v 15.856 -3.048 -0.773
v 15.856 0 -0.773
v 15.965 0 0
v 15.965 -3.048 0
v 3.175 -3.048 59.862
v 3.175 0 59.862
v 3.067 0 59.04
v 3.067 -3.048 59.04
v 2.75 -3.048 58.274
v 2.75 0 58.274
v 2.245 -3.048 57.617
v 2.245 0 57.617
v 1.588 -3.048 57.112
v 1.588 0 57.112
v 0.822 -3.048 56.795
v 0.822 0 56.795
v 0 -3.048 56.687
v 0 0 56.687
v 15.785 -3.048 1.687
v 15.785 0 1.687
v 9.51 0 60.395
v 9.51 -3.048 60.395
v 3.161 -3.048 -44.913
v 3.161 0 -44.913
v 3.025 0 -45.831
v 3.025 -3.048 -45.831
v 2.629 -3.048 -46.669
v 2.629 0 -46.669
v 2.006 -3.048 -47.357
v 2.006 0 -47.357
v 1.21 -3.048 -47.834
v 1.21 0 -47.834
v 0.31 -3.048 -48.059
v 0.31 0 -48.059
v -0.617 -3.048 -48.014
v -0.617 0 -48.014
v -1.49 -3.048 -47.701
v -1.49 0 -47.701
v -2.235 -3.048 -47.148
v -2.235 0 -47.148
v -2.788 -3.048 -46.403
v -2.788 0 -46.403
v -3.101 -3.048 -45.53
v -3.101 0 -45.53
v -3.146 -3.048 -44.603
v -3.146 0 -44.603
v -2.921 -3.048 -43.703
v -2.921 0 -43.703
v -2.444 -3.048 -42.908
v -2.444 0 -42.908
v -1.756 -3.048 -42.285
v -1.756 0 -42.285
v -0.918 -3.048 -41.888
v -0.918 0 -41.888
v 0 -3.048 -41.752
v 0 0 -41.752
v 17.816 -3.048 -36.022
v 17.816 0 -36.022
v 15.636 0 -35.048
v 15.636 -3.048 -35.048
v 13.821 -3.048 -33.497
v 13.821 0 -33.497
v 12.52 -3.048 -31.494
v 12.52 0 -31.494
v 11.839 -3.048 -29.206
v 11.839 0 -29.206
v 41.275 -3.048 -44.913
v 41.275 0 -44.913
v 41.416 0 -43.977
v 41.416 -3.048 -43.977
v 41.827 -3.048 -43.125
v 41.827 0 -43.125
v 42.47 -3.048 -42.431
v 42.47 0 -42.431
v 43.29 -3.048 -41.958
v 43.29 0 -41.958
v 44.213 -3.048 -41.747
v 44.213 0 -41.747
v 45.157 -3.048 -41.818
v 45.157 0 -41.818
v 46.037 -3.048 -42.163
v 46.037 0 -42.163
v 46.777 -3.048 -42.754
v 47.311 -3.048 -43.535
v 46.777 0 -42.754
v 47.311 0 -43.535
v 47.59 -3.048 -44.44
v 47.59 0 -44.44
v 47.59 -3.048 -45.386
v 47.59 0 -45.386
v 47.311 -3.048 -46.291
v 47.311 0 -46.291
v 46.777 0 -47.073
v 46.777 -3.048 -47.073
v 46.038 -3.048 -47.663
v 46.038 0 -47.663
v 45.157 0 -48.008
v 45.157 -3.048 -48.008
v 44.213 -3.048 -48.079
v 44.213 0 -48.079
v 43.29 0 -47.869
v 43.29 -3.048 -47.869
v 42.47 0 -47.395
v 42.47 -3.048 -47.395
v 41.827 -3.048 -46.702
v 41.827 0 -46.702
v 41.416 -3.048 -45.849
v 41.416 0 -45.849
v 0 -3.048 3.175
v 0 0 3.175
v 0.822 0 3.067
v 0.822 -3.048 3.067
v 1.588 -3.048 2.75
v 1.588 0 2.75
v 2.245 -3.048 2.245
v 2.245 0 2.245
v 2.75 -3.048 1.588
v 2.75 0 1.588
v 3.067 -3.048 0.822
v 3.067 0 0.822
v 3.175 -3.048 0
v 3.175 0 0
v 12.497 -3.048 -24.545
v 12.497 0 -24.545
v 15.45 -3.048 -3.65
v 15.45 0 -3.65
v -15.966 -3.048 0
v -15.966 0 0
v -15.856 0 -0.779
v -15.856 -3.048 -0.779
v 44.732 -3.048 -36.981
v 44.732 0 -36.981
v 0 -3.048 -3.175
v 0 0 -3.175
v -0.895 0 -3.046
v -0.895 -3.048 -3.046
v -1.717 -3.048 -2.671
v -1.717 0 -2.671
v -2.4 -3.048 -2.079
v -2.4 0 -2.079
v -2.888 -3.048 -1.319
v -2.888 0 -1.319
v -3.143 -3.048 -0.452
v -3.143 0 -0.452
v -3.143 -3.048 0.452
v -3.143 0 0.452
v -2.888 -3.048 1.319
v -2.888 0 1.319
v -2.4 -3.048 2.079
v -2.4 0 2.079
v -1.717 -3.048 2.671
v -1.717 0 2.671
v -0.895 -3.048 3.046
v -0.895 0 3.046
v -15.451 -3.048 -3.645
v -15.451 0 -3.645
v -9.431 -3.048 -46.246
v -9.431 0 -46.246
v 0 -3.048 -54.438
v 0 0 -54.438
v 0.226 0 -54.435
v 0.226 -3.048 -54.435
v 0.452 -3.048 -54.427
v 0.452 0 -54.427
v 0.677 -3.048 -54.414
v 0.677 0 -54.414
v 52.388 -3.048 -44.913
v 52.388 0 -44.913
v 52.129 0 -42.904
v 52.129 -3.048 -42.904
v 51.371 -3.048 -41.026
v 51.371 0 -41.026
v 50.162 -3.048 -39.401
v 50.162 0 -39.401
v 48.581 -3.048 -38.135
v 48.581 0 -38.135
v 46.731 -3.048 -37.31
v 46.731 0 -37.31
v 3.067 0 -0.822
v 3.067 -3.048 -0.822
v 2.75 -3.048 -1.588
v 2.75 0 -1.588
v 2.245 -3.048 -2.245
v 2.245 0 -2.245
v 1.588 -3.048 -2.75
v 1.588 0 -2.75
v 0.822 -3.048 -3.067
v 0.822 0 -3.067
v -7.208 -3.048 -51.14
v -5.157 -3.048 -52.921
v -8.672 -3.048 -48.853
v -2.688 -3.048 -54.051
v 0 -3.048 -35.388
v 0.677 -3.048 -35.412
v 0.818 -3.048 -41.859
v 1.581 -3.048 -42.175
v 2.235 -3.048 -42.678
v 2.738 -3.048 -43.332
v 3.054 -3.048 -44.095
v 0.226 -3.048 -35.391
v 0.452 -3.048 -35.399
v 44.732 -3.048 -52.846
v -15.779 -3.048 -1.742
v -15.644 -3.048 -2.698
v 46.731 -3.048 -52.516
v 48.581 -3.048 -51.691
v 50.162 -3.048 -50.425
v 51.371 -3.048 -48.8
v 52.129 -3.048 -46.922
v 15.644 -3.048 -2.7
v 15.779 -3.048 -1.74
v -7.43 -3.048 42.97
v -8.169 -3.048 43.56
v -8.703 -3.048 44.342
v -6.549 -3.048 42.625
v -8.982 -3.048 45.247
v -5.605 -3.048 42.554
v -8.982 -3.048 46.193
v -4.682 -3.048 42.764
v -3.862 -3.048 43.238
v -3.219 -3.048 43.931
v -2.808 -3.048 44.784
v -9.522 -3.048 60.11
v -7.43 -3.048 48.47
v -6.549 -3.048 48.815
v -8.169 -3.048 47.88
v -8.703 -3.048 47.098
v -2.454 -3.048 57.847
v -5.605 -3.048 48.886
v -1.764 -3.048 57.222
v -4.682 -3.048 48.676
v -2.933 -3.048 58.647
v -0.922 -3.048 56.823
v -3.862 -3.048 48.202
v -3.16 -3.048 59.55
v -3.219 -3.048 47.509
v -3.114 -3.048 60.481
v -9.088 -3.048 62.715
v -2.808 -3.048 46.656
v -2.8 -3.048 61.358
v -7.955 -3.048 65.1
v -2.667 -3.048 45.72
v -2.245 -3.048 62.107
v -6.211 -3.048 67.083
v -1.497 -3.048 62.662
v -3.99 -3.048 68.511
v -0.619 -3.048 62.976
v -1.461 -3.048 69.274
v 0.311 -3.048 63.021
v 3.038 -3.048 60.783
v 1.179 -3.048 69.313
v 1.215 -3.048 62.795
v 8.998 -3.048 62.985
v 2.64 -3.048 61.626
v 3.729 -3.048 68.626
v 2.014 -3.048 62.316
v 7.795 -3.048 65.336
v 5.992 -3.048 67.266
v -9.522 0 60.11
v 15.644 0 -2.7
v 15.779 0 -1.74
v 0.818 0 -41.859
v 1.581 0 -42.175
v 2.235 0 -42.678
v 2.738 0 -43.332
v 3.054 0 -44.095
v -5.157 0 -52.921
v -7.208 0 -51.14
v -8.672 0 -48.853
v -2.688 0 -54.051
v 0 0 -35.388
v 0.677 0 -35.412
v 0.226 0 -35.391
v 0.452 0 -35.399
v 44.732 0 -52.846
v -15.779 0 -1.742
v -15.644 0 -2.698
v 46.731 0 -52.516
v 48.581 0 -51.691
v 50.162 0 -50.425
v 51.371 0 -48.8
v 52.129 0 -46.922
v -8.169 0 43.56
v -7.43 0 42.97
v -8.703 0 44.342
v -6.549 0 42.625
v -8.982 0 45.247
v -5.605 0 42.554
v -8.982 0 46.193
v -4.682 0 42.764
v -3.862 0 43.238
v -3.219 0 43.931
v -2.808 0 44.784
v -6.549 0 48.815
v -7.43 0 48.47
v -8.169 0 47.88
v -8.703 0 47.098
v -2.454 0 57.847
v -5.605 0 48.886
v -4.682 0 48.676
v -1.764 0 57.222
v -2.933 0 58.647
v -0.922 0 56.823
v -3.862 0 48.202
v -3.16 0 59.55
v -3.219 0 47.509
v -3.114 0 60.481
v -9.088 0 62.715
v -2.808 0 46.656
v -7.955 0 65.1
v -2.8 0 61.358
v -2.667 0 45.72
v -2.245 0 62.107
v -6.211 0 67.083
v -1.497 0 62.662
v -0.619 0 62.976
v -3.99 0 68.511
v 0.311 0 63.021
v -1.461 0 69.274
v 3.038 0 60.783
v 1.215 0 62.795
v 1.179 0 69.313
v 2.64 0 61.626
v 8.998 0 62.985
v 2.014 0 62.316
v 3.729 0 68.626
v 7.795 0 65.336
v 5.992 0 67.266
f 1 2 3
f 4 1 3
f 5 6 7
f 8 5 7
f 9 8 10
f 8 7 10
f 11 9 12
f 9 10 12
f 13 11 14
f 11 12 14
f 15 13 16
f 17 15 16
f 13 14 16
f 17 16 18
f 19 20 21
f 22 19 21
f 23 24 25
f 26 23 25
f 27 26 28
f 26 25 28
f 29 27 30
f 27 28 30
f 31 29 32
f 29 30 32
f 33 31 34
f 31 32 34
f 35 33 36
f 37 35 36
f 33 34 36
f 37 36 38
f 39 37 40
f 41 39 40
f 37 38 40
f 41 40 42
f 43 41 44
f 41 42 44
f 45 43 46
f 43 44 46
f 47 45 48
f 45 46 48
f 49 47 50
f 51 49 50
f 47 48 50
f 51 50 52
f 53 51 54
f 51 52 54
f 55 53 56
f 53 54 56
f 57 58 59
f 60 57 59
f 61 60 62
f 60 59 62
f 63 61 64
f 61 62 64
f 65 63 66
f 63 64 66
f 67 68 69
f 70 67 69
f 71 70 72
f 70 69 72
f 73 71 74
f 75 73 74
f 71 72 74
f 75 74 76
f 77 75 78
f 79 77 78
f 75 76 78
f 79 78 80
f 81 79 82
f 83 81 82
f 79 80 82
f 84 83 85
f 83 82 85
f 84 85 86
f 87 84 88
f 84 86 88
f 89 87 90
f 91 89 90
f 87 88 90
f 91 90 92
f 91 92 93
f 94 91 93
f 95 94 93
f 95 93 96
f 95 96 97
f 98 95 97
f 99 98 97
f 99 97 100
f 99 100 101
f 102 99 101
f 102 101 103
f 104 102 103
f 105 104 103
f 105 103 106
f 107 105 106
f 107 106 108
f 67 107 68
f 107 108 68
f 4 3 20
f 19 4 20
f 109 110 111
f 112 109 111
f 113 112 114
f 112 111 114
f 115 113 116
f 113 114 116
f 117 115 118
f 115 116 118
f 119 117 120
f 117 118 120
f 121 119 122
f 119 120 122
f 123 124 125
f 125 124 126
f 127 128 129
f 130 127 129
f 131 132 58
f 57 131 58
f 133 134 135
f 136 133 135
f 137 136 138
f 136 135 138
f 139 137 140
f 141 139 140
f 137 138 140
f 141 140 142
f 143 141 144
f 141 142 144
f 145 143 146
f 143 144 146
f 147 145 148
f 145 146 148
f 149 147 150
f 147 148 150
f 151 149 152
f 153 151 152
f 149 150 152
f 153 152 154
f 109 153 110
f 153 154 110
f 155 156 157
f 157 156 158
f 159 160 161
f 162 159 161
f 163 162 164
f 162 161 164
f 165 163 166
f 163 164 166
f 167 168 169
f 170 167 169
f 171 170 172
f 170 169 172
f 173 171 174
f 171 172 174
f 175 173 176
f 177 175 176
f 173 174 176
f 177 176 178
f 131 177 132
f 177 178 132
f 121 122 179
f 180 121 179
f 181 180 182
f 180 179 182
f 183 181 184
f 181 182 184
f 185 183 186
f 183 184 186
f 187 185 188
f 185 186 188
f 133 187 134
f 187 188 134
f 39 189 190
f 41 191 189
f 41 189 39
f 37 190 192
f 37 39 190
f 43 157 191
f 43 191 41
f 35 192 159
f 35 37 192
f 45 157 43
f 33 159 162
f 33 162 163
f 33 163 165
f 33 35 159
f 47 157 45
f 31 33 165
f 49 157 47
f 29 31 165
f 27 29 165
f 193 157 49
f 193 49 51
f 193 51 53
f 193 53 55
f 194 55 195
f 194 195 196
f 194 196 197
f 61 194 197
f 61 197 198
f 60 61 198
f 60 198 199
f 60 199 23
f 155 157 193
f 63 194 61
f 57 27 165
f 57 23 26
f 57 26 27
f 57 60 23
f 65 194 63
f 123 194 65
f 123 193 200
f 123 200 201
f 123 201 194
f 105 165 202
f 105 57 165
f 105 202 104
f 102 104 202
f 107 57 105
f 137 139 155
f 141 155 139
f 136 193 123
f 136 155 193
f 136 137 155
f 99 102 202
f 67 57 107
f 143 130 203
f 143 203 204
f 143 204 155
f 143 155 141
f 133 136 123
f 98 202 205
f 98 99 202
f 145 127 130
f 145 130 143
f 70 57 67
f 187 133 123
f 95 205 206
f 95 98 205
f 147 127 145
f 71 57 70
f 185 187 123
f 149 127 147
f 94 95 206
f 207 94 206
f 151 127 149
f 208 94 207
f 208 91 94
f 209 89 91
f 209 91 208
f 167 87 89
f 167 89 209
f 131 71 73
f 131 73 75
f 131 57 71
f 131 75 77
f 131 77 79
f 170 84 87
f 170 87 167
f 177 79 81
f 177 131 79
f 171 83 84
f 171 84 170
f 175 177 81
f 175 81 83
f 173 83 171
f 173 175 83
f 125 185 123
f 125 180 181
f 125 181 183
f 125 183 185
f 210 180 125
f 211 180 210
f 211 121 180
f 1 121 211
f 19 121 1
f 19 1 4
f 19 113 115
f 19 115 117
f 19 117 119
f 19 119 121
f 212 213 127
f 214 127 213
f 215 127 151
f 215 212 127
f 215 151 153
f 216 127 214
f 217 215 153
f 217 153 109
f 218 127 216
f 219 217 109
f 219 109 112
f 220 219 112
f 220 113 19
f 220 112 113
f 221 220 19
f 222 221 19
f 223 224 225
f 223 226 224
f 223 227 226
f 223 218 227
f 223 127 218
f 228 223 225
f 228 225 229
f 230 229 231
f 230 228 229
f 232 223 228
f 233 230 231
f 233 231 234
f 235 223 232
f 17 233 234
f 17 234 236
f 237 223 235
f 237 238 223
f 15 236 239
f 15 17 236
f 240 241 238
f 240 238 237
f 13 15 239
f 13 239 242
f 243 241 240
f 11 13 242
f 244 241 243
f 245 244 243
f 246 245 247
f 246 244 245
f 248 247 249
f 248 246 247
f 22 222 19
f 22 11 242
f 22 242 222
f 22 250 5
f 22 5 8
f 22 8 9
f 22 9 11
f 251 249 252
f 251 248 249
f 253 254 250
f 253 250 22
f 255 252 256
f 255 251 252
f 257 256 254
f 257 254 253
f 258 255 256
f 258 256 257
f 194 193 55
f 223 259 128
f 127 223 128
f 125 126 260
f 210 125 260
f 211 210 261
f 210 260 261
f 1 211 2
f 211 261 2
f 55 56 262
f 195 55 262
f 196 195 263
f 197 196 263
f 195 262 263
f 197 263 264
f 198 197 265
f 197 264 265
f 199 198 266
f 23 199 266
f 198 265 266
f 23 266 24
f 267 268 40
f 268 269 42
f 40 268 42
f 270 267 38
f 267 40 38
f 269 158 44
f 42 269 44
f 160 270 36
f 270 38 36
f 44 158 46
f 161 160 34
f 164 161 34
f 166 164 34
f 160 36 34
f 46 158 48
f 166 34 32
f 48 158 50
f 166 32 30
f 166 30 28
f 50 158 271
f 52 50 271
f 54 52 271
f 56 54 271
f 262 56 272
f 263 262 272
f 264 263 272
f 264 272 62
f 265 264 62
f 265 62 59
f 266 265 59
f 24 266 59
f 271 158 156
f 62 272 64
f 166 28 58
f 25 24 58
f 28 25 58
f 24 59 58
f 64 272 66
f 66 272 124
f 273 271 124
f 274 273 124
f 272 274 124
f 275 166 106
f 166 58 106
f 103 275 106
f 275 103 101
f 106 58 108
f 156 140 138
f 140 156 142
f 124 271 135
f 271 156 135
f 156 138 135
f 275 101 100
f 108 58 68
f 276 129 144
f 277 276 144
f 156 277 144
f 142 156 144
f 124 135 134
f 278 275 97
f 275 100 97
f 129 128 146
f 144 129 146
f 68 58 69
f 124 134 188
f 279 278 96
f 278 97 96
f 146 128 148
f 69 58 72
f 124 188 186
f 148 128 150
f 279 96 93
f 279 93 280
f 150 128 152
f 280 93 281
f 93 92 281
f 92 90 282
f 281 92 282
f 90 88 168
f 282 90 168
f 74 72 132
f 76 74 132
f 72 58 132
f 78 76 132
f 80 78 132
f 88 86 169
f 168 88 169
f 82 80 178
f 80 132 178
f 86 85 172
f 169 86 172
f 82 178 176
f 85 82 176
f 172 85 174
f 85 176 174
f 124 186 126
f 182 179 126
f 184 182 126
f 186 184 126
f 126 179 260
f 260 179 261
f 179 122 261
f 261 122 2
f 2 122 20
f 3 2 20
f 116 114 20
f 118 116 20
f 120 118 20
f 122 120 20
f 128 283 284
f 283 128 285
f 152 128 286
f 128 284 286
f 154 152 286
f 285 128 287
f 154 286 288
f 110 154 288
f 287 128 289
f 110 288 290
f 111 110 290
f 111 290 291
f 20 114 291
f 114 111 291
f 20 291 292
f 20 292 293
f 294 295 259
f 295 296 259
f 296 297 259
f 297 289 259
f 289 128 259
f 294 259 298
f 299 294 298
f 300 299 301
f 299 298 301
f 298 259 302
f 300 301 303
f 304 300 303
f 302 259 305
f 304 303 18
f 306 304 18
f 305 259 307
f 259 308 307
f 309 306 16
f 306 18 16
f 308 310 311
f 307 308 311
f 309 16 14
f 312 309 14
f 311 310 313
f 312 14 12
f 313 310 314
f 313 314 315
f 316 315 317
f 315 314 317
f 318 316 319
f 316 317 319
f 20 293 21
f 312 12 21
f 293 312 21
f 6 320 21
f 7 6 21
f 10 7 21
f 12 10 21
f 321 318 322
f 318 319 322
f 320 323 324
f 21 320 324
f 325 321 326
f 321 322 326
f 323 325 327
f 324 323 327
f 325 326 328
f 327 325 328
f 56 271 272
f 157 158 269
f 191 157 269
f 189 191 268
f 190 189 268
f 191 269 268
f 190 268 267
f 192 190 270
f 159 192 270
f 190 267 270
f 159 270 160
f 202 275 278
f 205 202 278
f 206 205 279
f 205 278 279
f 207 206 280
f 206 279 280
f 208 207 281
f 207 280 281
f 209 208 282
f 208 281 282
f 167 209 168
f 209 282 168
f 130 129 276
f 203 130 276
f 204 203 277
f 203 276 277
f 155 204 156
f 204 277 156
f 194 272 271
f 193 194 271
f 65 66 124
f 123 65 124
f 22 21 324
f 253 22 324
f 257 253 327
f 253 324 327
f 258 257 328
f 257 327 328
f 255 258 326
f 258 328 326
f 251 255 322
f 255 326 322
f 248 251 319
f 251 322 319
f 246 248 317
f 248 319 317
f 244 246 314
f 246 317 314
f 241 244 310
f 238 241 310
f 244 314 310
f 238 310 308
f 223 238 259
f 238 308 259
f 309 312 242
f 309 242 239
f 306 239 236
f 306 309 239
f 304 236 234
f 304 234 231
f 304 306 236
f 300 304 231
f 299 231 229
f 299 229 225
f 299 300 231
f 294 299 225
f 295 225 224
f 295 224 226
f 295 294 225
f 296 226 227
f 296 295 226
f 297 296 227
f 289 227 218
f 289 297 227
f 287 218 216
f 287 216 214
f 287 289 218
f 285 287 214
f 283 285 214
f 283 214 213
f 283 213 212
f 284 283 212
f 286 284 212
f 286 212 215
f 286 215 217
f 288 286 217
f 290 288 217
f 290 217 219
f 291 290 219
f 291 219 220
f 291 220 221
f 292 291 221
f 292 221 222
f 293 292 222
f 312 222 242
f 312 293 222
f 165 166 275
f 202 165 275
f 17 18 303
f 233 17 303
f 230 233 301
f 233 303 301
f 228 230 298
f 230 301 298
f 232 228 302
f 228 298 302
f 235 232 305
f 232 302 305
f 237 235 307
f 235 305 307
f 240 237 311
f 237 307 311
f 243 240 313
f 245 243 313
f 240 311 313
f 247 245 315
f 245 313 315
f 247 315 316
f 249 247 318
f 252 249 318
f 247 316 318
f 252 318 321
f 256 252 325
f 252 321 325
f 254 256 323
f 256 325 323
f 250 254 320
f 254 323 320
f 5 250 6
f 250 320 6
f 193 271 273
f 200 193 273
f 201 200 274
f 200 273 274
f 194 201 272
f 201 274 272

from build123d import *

# Parameters (mm, degrees)
F0_R     = 3.175
F1_DEPTH = 3.048


with BuildPart() as f1:
    # F0 (on Front) → F1 (new body)
    with BuildSketch(Plane.XZ):
        with BuildLine():
            ThreePointArc((-9.521768482, 60.109775595), (-6.822342257, 53.2147835566), (0, 50.3366829186))
            ThreePointArc((0, 50.3366829186), (6.7351920908, 53.1264908278), (9.525, 59.8616829186))
            ThreePointArc((9.525, 59.8616829186), (9.5212685047, 60.1282744826), (9.5100769424, 60.3946571678))
            ThreePointArc((9.5100769424, 60.3946571678), (-0.1425606912, 69.3856160057), (-9.521768482, 60.109775595))
        make_face()
        with BuildLine():
            ThreePointArc((3.175, 59.8616829186), (2.2450640303, 57.6166188883), (0, 56.6866829186))
            ThreePointArc((0, 56.6866829186), (-2.2450640303, 62.1067469488), (3.175, 59.8616829186))
        make_face(mode=Mode.SUBTRACT)
        with BuildLine():
            ThreePointArc((9.525, 59.8616829186), (6.7351920908, 53.1264908278), (0, 50.3366829186))
            Line((0, 50.3366829186), (0, 15.875))
            ThreePointArc((0, 15.875), (10.6120502723, 11.8067783082), (15.7850866092, 1.6872064905))
            Line((15.7850866092, 1.6872064905), (9.5100769424, 60.3946571678))
            ThreePointArc((9.5100769424, 60.3946571678), (9.5212685047, 60.1282744826), (9.525, 59.8616829186))
        make_face()
        with BuildLine():
            Line((0, 15.875), (0, 50.3366829186))
            ThreePointArc((0, 50.3366829186), (-6.822342257, 53.2147835566), (-9.521768482, 60.109775595))
            Line((-9.521768482, 60.109775595), (-15.7845502334, 1.6922171637))
            ThreePointArc((-15.7845502334, 1.6922171637), (-10.6101761891, 11.808462484), (0, 15.875))
        make_face()
        with Locations((-5.8420007117, 45.7200035453)):
            Circle(F0_R, mode=Mode.SUBTRACT)
        with BuildLine():
            ThreePointArc((15.7850866092, 1.6872064905), (10.6120502723, 11.8067783082), (0, 15.875))
            Line((0, 15.875), (0, 3.175))
            ThreePointArc((0, 3.175), (2.2450640303, 2.2450640303), (3.175, 0))
            ThreePointArc((3.175, 0), (2.2450640303, -2.2450640303), (0, -3.175))
            Line((0, -3.175), (0, -15.875))
            ThreePointArc((0, -15.875), (9.8507507088, -12.4490294992), (15.4497368395, -3.6498296658))
            Line((15.4497368395, -3.6498296658), (15.8561487715, -0.7734152414))
            ThreePointArc((15.8561487715, -0.7734152414), (15.8702864931, -0.3868224736), (15.875, 0))
            ThreePointArc((15.875, 0), (15.8525057155, 0.8448002958), (15.7850866092, 1.6872064905))
        make_face()
        with BuildLine():
            Line((0, 3.175), (0, 15.875))
            ThreePointArc((0, 15.875), (-10.6101761891, 11.808462484), (-15.7845502334, 1.6922171637))
            ThreePointArc((-15.7845502334, 1.6922171637), (-15.8683946878, 0.4579028636), (-15.8558659237, -0.7791924092))
            Line((-15.8558659237, -0.7791924092), (-15.4509817985, -3.644555729))
            ThreePointArc((-15.4509817985, -3.644555729), (-9.852875286, -12.4473480549), (0, -15.875))
            Line((0, -15.875), (0, -3.175))
            ThreePointArc((0, -3.175), (-3.175, 0), (0, 3.175))
        make_face()
        with BuildLine():
            Line((15.9654255085, 0), (15.7850866092, 1.6872064905))
            ThreePointArc((15.7850866092, 1.6872064905), (15.8525057155, 0.8448002958), (15.875, 0))
            ThreePointArc((15.875, 0), (15.8702864931, -0.3868224736), (15.8561487715, -0.7734152414))
            Line((15.8561487715, -0.7734152414), (15.9654255085, 0))
        make_face()
        with BuildLine():
            ThreePointArc((-15.8558659237, -0.7791924092), (-15.8683946878, 0.4579028636), (-15.7845502334, 1.6922171637))
            Line((-15.7845502334, 1.6922171637), (-15.9659680649, 0))
            Line((-15.9659680649, 0), (-15.8558659237, -0.7791924092))
        make_face()
        with BuildLine():
            Line((-15.4509817985, -3.644555729), (-15.8558659237, -0.7791924092))
            ThreePointArc((-15.8558659237, -0.7791924092), (-15.7188503178, -2.2211190167), (-15.4509817985, -3.644555729))
        make_face()
        with BuildLine():
            ThreePointArc((15.4497368395, -3.6498296658), (9.8507507088, -12.4490294992), (0, -15.875))
            Line((0, -15.875), (0, -35.3880759952))
            Line((0, -35.3880759952), (0, -41.7517314814))
            ThreePointArc((0, -41.7517314814), (2.2354081434, -42.6776678518), (3.1613445139, -44.9130759952))
            Line((3.1613445139, -44.9130759952), (9.525, -44.9130759952))
            Line((9.525, -44.9130759952), (36.5125, -44.9130759952))
            ThreePointArc((36.5125, -44.9130759952), (38.9380895153, -39.2014432113), (44.7324052746, -36.9806013807))
            Line((44.7324052746, -36.9806013807), (17.816256185, -36.0223553297))
            ThreePointArc((17.816256185, -36.0223553297), (13.8210029222, -33.4966577049), (11.8389221297, -29.2056726364))
            ThreePointArc((11.8389221297, -29.2056726364), (11.8327512172, -26.8281242675), (12.4973838852, -24.545354515))
            Line((12.4973838852, -24.545354515), (15.4497368395, -3.6498296658))
        make_face()
        with BuildLine():
            Line((0.6773435479, -35.4121902093), (0, -35.3880759952))
            ThreePointArc((0, -35.3880759952), (0.3388863295, -35.3941064578), (0.6773435479, -35.4121902093))
        make_face(mode=Mode.SUBTRACT)
        with BuildLine():
            Line((0, -35.3880759952), (0, -15.875))
            ThreePointArc((0, -15.875), (-9.852875286, -12.4473480549), (-15.4509817985, -3.644555729))
            Line((-15.4509817985, -3.644555729), (-9.4313101907, -46.2457474053))
            ThreePointArc((-9.4313101907, -46.2457474053), (-7.1909429208, -38.6667999119), (0, -35.3880759952))
        make_face()
        with BuildLine():
            ThreePointArc((15.4497368395, -3.6498296658), (15.718875865, -2.2209382121), (15.8561487715, -0.7734152414))
            Line((15.8561487715, -0.7734152414), (15.4497368395, -3.6498296658))
        make_face()
        with BuildLine():
            Line((0, -41.7517314814), (0, -35.3880759952))
            ThreePointArc((0, -35.3880759952), (-7.1909429208, -38.6667999119), (-9.4313101907, -46.2457474053))
            ThreePointArc((-9.4313101907, -46.2457474053), (-6.2462760834, -52.104018916), (0, -54.4380759952))
            Line((0, -54.4380759952), (0.6773435479, -54.4139617812))
            ThreePointArc((0.6773435479, -54.4139617812), (6.9705567315, -51.4043750835), (9.525, -44.9130759952))
            Line((9.525, -44.9130759952), (3.1613445139, -44.9130759952))
            ThreePointArc((3.1613445139, -44.9130759952), (-2.2354081434, -47.1484841387), (0, -41.7517314814))
        make_face()
        with BuildLine():
            Line((11.8389221297, -29.2056726364), (12.4973838852, -24.545354515))
            ThreePointArc((12.4973838852, -24.545354515), (11.8327512172, -26.8281242675), (11.8389221297, -29.2056726364))
        make_face()
        with BuildLine():
            Line((0.6773435479, -54.4139617812), (0, -54.4380759952))
            ThreePointArc((0, -54.4380759952), (0.3388863295, -54.4320455327), (0.6773435479, -54.4139617812))
        make_face()
        with BuildLine():
            ThreePointArc((9.525, -44.9130759952), (6.9705567315, -51.4043750835), (0.6773435479, -54.4139617812))
            Line((0.6773435479, -54.4139617812), (44.7324052746, -52.8455506098))
            ThreePointArc((44.7324052746, -52.8455506098), (38.9380895153, -50.6247087792), (36.5125, -44.9130759952))
            Line((36.5125, -44.9130759952), (9.525, -44.9130759952))
        make_face()
        with BuildLine():
            ThreePointArc((36.5125, -44.9130759952), (38.9380895153, -50.6247087792), (44.7324052746, -52.8455506098))
            ThreePointArc((44.7324052746, -52.8455506098), (50.1616327839, -50.42498648), (52.3875, -44.9130759952))
            ThreePointArc((52.3875, -44.9130759952), (50.1616327839, -39.4011655105), (44.7324052746, -36.9806013807))
            ThreePointArc((44.7324052746, -36.9806013807), (38.9380895153, -39.2014432113), (36.5125, -44.9130759952))
        make_face()
        with BuildLine():
            ThreePointArc((47.625, -44.9130759952), (44.45, -48.0880759952), (41.275, -44.9130759952))
            ThreePointArc((41.275, -44.9130759952), (44.45, -41.7380759952), (47.625, -44.9130759952))
        make_face(mode=Mode.SUBTRACT)
    extrude(amount=F1_DEPTH)


solid = f1.part
